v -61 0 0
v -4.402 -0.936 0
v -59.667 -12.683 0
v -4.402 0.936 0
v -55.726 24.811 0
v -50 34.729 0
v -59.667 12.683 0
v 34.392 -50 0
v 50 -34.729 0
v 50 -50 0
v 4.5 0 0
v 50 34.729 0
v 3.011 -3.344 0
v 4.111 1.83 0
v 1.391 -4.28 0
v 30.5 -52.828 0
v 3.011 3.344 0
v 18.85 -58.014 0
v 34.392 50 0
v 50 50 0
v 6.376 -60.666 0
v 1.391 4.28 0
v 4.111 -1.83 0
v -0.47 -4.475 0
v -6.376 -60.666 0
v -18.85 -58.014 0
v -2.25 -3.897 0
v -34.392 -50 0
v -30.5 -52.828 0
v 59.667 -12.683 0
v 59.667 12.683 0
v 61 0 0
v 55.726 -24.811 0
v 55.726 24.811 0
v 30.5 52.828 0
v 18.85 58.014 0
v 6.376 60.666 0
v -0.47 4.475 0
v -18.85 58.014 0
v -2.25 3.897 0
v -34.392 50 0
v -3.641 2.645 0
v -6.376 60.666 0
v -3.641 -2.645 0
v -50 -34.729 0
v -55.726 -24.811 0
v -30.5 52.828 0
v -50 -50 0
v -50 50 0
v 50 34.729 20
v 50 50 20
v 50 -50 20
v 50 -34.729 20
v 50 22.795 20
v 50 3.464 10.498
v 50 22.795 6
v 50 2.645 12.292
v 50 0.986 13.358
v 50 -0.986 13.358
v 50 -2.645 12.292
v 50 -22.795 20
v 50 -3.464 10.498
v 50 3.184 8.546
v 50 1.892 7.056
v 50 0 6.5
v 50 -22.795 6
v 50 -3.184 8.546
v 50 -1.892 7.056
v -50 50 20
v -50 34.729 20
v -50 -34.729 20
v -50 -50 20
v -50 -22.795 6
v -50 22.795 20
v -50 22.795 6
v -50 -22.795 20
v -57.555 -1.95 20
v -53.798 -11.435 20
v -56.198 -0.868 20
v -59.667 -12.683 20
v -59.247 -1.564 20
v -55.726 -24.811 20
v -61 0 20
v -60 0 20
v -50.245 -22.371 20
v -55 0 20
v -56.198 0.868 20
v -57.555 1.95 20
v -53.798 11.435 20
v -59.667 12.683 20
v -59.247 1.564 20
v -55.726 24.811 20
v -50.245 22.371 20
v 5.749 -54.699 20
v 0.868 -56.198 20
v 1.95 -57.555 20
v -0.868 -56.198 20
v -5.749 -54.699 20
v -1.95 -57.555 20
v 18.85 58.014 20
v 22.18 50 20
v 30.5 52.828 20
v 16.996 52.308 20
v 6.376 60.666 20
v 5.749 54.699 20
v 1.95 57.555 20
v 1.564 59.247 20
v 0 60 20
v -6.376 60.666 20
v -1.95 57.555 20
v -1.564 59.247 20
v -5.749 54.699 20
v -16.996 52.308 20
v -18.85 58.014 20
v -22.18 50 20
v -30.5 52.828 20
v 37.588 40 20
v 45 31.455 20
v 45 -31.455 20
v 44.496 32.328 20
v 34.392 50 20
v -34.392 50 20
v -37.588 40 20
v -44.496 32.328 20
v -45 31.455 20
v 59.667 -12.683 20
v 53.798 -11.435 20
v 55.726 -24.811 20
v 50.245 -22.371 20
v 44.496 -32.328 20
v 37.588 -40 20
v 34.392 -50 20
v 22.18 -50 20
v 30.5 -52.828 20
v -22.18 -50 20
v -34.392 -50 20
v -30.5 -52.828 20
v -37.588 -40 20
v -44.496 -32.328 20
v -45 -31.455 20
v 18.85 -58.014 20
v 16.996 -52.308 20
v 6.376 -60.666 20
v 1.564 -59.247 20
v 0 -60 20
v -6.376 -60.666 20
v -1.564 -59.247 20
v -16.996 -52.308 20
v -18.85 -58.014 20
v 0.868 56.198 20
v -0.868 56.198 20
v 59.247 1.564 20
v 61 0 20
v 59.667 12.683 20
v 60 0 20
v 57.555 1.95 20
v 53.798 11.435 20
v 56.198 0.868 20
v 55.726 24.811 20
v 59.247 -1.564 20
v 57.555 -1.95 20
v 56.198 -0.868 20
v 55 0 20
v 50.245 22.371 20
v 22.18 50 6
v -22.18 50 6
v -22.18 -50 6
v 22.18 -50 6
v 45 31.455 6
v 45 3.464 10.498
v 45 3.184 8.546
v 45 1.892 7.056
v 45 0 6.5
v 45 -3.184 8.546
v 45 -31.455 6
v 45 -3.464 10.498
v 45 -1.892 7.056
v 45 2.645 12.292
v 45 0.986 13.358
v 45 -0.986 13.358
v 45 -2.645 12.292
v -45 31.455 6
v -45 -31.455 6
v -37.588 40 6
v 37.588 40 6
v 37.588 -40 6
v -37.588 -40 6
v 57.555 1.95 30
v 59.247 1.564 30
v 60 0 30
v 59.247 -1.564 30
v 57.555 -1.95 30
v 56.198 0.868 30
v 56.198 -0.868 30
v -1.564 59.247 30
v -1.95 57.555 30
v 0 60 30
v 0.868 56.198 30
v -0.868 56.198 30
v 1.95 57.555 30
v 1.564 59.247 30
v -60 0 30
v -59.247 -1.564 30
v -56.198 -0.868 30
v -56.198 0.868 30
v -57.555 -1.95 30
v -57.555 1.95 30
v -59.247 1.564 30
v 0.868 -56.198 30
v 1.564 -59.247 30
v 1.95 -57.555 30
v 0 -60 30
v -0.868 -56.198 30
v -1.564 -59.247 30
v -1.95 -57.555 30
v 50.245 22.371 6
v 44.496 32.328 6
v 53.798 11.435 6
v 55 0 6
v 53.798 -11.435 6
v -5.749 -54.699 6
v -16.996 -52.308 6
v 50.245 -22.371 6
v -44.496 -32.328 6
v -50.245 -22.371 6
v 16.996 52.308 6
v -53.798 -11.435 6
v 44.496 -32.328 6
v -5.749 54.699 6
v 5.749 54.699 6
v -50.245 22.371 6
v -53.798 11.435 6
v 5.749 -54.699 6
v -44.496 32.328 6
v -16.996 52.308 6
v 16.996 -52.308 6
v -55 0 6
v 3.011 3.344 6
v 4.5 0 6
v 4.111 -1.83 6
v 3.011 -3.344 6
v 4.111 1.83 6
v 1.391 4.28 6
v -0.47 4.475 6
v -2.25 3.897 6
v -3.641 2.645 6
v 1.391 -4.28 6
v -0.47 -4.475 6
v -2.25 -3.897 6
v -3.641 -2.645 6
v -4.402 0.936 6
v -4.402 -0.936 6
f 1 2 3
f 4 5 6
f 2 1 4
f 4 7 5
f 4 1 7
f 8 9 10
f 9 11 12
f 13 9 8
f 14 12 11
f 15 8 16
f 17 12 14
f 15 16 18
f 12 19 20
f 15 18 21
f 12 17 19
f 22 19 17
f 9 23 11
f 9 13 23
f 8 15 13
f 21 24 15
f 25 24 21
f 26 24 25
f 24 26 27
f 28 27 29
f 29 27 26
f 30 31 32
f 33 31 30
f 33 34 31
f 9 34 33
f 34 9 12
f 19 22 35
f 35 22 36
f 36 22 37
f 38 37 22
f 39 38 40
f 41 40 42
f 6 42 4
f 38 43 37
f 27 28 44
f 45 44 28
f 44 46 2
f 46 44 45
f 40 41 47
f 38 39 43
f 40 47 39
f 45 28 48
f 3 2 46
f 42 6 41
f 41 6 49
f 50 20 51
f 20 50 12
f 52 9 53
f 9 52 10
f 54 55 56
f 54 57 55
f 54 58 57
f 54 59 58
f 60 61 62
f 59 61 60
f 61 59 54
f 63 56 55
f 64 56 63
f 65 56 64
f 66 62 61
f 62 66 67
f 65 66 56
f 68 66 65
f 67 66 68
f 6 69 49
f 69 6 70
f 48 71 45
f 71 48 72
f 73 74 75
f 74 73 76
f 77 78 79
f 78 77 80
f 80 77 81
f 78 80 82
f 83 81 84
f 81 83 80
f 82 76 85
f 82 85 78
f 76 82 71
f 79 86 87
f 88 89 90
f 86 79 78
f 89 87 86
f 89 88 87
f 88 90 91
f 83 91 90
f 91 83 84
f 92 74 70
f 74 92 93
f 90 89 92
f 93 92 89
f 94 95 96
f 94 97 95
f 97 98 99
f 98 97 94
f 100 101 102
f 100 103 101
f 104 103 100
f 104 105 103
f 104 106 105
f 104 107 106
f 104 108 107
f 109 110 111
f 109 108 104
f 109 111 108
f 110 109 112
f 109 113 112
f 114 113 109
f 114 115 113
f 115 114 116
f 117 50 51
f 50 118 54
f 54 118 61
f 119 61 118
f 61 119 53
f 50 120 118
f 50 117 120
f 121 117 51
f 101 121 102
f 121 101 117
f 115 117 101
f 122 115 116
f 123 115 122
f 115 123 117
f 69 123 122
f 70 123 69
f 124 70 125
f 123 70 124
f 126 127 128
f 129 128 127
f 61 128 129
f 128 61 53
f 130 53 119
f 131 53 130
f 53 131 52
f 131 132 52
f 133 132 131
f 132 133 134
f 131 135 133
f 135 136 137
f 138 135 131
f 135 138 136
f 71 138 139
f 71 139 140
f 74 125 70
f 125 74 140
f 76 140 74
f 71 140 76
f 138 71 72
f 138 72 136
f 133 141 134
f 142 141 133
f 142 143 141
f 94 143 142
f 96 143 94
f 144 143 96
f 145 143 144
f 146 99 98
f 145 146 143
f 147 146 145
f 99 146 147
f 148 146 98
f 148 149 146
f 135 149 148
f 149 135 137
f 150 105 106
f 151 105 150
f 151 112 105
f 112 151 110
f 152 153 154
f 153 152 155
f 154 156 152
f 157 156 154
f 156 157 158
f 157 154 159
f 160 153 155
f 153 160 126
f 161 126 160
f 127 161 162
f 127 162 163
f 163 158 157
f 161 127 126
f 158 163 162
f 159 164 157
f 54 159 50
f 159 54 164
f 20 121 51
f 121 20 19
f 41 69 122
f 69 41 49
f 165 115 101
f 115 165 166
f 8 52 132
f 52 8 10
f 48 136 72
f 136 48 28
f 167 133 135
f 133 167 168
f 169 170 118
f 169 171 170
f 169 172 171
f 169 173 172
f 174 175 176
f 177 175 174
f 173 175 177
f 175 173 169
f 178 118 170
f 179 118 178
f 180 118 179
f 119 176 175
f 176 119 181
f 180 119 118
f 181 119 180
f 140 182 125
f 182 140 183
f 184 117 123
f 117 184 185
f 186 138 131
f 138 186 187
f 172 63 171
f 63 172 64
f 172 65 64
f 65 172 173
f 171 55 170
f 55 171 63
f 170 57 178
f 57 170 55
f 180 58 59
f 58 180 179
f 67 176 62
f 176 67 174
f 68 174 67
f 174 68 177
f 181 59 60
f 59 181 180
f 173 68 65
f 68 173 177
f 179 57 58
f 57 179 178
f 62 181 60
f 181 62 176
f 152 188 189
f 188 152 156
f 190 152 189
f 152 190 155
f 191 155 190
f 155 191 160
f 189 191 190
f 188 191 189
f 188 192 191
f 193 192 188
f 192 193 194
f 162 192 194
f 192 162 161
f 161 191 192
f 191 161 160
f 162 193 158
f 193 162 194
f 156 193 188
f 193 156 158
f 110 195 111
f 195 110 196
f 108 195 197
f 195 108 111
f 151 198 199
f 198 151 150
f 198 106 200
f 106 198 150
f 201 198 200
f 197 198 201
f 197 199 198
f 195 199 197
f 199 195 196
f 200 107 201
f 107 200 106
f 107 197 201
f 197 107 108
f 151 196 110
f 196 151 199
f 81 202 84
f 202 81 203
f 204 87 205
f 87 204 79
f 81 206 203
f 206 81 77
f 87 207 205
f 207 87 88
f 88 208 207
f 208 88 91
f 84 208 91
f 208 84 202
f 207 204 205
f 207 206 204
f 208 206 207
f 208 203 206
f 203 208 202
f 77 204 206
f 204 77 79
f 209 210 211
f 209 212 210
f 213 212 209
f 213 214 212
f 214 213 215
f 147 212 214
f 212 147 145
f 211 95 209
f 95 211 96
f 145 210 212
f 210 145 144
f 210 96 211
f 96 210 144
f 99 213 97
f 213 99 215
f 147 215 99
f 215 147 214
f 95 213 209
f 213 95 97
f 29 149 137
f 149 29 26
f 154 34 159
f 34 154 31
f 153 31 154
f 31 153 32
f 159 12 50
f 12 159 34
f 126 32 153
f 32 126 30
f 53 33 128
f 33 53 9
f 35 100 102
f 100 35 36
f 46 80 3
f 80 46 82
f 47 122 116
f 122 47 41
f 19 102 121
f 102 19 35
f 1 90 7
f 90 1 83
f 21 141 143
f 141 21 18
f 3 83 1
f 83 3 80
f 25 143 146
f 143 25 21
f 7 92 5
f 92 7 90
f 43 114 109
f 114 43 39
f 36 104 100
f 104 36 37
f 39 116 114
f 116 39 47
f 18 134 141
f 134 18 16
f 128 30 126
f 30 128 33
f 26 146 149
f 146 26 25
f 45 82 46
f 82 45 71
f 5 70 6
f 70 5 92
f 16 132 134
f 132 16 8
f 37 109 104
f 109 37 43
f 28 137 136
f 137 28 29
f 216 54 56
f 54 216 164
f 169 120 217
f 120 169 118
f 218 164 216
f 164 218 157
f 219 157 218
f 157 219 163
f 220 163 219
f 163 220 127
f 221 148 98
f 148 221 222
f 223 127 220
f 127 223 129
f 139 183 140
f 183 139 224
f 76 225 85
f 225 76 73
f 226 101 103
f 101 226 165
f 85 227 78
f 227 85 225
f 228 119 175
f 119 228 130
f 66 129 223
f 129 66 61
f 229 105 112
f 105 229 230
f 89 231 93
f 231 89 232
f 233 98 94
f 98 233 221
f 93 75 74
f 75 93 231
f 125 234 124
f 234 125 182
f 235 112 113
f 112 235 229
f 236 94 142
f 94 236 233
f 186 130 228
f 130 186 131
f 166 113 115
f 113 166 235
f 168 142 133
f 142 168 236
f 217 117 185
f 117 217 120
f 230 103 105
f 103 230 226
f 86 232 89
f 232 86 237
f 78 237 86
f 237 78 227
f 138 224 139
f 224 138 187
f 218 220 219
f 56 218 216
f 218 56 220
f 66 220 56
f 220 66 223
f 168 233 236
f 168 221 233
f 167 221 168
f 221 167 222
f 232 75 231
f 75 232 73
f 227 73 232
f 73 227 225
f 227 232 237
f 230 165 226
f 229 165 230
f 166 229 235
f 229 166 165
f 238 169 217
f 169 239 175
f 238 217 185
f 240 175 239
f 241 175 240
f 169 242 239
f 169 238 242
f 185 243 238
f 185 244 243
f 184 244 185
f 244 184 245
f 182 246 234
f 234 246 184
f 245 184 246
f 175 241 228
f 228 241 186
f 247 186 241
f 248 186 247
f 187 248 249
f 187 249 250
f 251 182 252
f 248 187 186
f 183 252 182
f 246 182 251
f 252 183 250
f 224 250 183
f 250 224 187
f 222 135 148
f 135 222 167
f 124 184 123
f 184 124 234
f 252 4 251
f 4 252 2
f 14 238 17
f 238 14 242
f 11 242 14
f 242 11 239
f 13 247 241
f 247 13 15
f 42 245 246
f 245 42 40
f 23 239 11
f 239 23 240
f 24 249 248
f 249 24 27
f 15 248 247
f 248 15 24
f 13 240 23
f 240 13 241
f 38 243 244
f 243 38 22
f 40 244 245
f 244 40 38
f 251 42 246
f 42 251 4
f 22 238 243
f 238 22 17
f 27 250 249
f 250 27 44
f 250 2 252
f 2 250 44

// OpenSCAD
union() {
translate([0,0,10]) rotate([0,90,0]) difference() {
difference() {
cube([20,100,100],center=true); 
cube([20,80,90],center=true); 
}
cylinder(100,3.5,3.5); 
}
difference() {
union() {
translate([0,0,20]) union() {
union() {
union() {
union() {
rotate([0,0,0]) translate([58,0,-10]) cylinder(20,2,2); 
}
rotate([0,0,90]) translate([58,0,-10]) cylinder(20,2,2); 
}
rotate([0,0,180]) translate([58,0,-10]) cylinder(20,2,2); 
}
rotate([0,0,270]) translate([58,0,-10]) cylinder(20,2,2); 
}
difference() {
cylinder(20,61,61); 
translate([0,0,6]) cylinder(20,55,55); 
}
}
cylinder(30,4.5,4.5); 
}
}
